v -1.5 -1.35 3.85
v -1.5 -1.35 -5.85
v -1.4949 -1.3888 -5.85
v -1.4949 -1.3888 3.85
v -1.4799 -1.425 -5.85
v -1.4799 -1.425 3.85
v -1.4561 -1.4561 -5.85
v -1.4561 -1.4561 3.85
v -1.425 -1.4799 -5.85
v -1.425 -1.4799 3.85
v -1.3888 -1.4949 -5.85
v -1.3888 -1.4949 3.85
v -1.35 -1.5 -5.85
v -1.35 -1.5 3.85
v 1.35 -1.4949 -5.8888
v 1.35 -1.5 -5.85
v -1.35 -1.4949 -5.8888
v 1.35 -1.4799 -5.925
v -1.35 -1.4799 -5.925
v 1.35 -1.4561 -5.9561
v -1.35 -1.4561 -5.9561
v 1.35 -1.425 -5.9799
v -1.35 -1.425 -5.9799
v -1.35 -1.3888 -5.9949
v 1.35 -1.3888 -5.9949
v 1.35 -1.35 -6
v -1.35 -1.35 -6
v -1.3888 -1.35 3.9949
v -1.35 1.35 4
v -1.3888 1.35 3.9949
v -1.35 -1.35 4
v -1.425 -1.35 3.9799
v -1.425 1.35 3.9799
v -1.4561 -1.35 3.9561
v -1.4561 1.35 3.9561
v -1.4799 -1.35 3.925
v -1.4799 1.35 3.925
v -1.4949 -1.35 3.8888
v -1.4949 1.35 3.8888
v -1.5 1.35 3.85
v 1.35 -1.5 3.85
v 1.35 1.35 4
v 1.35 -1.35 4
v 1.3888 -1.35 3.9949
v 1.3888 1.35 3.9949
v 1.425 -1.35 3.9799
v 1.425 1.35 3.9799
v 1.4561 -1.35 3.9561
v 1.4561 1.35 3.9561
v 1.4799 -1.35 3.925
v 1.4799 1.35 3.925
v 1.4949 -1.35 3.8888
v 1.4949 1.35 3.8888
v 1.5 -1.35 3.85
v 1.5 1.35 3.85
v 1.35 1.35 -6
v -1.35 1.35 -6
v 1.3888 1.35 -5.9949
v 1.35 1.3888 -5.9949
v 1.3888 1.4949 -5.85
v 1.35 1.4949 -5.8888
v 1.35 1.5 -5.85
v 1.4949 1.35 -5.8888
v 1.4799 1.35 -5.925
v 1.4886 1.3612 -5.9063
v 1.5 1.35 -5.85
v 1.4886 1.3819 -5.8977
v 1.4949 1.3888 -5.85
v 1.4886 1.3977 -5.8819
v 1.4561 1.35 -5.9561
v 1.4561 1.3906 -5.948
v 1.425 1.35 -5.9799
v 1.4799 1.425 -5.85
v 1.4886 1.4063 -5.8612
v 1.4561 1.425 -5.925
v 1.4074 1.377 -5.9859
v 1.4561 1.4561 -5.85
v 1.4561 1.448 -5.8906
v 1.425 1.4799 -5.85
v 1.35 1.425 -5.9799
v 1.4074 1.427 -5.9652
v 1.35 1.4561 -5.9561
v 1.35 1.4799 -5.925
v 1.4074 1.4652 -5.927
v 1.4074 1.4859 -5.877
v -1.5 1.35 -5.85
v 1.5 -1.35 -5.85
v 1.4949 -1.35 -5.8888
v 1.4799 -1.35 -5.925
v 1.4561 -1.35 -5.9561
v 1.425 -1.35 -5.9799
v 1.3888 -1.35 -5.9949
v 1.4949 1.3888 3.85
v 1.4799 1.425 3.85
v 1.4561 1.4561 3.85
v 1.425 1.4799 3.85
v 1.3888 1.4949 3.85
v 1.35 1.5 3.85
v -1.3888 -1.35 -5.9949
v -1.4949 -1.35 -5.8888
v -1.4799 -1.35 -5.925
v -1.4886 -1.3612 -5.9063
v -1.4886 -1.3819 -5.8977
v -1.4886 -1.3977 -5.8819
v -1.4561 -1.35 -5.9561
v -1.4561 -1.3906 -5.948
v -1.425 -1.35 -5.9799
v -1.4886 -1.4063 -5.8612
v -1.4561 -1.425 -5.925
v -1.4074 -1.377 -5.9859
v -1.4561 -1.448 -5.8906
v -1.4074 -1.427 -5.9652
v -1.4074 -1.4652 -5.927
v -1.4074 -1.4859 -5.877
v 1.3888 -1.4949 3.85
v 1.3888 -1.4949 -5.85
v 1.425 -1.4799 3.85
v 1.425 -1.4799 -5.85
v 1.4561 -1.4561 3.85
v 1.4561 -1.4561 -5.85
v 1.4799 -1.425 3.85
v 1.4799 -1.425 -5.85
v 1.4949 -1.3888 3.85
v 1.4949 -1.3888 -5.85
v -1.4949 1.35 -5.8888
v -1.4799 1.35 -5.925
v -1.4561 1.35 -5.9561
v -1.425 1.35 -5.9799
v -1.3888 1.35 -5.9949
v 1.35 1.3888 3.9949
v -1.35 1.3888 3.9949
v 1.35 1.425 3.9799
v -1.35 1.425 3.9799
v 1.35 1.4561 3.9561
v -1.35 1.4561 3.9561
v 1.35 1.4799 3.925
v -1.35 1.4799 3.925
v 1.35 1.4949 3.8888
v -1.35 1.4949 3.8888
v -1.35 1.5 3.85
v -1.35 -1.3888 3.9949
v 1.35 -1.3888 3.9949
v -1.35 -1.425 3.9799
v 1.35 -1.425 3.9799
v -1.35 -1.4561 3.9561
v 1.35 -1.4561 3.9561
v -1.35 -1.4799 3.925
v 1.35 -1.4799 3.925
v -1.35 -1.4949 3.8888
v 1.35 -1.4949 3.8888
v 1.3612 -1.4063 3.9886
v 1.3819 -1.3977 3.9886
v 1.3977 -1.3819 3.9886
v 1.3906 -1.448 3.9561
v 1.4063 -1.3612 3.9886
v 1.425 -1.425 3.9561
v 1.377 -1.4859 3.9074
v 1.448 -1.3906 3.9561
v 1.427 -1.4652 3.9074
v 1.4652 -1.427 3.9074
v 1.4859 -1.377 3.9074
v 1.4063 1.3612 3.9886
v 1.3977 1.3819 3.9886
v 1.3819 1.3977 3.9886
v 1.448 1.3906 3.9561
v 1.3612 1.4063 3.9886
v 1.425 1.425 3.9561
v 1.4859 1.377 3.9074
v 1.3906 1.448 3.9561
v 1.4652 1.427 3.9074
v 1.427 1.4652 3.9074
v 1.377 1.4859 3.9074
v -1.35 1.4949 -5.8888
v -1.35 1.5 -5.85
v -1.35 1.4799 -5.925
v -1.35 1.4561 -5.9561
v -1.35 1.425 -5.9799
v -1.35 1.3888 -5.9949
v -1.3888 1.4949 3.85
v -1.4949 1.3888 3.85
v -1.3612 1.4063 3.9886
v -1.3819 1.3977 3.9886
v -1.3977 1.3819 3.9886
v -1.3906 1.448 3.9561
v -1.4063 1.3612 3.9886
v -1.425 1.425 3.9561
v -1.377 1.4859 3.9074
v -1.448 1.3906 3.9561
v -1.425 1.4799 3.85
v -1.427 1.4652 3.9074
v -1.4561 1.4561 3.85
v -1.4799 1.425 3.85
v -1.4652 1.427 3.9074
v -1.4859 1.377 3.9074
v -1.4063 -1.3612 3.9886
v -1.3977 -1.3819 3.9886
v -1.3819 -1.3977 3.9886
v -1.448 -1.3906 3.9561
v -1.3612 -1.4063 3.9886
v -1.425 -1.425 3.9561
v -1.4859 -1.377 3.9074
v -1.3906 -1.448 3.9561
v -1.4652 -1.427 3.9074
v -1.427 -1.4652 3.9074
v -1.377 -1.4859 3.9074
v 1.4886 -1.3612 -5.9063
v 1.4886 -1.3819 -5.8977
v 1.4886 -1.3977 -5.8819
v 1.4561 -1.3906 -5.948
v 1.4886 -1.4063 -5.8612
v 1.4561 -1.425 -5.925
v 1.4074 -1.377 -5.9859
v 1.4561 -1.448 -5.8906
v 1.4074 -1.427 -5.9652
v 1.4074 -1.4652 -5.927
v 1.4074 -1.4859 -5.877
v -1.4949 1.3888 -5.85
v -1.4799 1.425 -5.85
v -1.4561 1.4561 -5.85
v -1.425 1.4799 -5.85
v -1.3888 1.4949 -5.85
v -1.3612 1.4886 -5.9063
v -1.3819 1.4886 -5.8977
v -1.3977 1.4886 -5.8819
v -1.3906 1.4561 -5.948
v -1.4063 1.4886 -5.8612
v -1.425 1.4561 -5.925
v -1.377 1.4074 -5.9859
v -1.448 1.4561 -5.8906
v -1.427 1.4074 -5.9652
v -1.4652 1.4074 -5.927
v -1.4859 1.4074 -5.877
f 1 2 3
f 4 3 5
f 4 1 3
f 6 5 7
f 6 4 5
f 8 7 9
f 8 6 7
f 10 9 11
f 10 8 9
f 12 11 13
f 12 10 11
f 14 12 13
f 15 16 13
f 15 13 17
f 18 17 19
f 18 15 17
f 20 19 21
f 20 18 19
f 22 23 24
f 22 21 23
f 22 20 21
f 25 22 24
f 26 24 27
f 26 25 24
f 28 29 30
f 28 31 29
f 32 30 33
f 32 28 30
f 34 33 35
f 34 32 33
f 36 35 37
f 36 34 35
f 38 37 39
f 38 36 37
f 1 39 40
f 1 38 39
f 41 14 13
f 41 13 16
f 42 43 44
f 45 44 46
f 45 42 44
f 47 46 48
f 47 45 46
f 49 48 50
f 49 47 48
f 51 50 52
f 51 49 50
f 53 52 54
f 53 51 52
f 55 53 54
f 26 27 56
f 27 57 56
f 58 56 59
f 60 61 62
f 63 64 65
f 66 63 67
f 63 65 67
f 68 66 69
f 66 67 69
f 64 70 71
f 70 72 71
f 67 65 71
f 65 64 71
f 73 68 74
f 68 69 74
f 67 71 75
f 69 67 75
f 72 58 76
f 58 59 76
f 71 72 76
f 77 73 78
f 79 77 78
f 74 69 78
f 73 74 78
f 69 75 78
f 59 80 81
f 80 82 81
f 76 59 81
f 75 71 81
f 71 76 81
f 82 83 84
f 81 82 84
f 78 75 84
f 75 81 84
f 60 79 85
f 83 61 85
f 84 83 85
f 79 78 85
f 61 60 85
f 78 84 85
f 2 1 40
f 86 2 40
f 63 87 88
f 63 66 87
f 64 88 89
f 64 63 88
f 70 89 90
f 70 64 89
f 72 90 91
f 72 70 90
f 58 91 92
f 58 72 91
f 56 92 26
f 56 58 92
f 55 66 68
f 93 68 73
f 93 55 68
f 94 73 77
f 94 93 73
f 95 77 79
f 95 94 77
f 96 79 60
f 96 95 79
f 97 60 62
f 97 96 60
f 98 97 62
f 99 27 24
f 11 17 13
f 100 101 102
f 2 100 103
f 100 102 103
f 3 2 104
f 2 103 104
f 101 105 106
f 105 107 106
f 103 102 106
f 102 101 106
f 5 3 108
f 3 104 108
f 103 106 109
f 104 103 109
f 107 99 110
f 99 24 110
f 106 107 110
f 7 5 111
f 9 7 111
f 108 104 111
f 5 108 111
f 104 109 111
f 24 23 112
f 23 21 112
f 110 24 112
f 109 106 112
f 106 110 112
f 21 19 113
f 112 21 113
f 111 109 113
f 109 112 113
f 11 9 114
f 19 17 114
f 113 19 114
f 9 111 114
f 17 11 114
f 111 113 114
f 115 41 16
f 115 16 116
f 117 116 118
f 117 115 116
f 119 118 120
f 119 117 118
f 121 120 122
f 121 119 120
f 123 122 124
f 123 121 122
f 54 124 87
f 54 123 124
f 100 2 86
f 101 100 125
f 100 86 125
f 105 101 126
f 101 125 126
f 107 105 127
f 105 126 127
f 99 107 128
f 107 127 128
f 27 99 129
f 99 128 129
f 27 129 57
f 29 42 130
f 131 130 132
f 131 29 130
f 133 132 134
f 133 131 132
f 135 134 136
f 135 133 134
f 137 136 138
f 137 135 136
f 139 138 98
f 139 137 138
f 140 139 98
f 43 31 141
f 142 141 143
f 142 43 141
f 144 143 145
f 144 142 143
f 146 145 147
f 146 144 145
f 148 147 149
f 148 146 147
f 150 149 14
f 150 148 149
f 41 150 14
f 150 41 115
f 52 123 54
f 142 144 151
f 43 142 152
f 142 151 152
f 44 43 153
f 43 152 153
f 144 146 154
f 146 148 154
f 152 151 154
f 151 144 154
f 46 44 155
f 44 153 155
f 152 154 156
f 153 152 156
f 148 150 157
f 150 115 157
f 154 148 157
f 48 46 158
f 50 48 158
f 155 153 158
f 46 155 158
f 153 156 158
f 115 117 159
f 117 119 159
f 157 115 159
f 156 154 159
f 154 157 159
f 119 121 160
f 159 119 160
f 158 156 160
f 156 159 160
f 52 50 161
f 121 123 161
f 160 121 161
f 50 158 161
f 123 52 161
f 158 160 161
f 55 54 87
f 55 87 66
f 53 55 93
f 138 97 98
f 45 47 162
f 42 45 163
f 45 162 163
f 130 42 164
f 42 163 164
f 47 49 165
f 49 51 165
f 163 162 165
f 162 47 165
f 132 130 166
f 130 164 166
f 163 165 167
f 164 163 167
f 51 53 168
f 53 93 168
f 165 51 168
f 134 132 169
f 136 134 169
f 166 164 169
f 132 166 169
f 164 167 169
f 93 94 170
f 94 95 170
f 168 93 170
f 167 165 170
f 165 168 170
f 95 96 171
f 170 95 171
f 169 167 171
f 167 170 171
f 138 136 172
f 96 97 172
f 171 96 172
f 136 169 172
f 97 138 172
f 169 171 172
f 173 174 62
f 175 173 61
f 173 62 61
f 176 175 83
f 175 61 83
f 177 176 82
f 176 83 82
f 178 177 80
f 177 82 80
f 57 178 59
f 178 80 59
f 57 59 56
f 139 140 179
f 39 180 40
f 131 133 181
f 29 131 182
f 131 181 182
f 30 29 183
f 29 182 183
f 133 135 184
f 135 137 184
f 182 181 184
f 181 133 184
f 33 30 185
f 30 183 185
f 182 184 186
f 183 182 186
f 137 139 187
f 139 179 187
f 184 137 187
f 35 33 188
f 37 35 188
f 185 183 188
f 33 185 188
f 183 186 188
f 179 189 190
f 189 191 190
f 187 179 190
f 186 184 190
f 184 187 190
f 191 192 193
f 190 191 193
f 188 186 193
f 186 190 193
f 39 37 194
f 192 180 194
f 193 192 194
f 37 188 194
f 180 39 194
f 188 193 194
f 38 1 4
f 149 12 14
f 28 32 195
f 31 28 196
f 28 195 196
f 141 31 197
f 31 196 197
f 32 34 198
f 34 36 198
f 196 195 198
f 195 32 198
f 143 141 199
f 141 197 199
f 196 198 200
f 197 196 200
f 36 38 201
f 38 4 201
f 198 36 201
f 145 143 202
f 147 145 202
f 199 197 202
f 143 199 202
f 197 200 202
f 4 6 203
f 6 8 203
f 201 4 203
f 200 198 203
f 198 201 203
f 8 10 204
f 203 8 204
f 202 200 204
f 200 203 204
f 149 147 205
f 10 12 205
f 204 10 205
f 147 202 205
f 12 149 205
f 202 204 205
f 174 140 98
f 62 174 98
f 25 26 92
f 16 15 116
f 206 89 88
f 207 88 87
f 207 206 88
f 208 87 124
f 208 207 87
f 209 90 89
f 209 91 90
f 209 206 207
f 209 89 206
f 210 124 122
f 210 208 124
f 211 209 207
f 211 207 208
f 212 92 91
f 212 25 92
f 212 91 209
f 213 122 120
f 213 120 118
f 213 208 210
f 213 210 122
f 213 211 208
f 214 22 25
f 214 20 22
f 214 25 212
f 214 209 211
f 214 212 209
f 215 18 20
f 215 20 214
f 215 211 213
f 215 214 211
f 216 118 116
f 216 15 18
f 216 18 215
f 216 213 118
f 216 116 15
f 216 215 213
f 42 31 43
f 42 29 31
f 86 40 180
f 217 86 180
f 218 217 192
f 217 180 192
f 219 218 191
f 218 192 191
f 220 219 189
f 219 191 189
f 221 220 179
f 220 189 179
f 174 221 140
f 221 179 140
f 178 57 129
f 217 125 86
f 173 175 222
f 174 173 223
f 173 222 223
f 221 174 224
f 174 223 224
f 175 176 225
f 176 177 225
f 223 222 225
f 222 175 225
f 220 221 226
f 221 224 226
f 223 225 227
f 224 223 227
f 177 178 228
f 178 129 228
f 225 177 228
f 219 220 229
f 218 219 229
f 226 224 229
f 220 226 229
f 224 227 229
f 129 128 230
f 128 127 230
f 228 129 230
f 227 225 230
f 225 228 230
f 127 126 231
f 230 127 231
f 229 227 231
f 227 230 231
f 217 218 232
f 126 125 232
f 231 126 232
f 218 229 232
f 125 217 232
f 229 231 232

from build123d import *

# Parameters (mm, degrees)
BOSS_EXTRUDE1_DEPTH      = 6
BOSS_EXTRUDE1_DEPTH_BACK = 6
SKETCH3_W                = 3
SKETCH3_H                = 3
FILLET2_R                = 0.15
ESQUISSE1_W              = 3
ESQUISSE1_H              = 3
ENL_V_MAT_EXTRU_1_DEPTH  = 2
CONG_1_R                 = 0.15


with BuildPart() as part:
    # Sketch3 → Boss-Extrude1 (new, two sides: drawn at the far end of the back side and taken through both)
    with BuildSketch(Plane.XY.offset(-BOSS_EXTRUDE1_DEPTH_BACK)):
        Rectangle(SKETCH3_W, SKETCH3_H)
    extrude(amount=BOSS_EXTRUDE1_DEPTH + BOSS_EXTRUDE1_DEPTH_BACK)

    # Fillet2
    fillet2_edges = [part.edges().sort_by_distance(p)[0] for p in [
        (0, 1.5, 6),
        (0, -1.5, -6),
        (-1.5, 0, -6),
        (0, 1.5, -6),
        (1.5, 0, -6),
        (-1.5, 0, 6),
        (0, -1.5, 6),
        (1.5, 0, 6),
        (-1.5, -1.5, 0),
        (-1.5, 1.5, 0),
        (1.5, 1.5, 0),
        (1.5, -1.5, 0),
    ]]
    fillet(fillet2_edges, radius=FILLET2_R)

    # Esquisse1 → Enlèv. mat.-Extru.1 (cut)
    with BuildSketch(Plane.XY.offset(6)):
        Rectangle(ESQUISSE1_W, ESQUISSE1_H)
    extrude(amount=-ENL_V_MAT_EXTRU_1_DEPTH, mode=Mode.SUBTRACT)

    # Congé1
    cong_1_edges = [part.edges().sort_by_distance(p)[0] for p in [
        (-1.456066017, -1.456066017, 4),
        (1.5, 0, 4),
        (0, -1.5, 4),
        (1.456066017, 1.456066017, 4),
        (1.456066017, -1.456066017, 4),
        (-1.456066017, 1.456066017, 4),
        (-1.5, 0, 4),
        (0, 1.5, 4),
    ]]
    fillet(cong_1_edges, radius=CONG_1_R)


solid = part.part
